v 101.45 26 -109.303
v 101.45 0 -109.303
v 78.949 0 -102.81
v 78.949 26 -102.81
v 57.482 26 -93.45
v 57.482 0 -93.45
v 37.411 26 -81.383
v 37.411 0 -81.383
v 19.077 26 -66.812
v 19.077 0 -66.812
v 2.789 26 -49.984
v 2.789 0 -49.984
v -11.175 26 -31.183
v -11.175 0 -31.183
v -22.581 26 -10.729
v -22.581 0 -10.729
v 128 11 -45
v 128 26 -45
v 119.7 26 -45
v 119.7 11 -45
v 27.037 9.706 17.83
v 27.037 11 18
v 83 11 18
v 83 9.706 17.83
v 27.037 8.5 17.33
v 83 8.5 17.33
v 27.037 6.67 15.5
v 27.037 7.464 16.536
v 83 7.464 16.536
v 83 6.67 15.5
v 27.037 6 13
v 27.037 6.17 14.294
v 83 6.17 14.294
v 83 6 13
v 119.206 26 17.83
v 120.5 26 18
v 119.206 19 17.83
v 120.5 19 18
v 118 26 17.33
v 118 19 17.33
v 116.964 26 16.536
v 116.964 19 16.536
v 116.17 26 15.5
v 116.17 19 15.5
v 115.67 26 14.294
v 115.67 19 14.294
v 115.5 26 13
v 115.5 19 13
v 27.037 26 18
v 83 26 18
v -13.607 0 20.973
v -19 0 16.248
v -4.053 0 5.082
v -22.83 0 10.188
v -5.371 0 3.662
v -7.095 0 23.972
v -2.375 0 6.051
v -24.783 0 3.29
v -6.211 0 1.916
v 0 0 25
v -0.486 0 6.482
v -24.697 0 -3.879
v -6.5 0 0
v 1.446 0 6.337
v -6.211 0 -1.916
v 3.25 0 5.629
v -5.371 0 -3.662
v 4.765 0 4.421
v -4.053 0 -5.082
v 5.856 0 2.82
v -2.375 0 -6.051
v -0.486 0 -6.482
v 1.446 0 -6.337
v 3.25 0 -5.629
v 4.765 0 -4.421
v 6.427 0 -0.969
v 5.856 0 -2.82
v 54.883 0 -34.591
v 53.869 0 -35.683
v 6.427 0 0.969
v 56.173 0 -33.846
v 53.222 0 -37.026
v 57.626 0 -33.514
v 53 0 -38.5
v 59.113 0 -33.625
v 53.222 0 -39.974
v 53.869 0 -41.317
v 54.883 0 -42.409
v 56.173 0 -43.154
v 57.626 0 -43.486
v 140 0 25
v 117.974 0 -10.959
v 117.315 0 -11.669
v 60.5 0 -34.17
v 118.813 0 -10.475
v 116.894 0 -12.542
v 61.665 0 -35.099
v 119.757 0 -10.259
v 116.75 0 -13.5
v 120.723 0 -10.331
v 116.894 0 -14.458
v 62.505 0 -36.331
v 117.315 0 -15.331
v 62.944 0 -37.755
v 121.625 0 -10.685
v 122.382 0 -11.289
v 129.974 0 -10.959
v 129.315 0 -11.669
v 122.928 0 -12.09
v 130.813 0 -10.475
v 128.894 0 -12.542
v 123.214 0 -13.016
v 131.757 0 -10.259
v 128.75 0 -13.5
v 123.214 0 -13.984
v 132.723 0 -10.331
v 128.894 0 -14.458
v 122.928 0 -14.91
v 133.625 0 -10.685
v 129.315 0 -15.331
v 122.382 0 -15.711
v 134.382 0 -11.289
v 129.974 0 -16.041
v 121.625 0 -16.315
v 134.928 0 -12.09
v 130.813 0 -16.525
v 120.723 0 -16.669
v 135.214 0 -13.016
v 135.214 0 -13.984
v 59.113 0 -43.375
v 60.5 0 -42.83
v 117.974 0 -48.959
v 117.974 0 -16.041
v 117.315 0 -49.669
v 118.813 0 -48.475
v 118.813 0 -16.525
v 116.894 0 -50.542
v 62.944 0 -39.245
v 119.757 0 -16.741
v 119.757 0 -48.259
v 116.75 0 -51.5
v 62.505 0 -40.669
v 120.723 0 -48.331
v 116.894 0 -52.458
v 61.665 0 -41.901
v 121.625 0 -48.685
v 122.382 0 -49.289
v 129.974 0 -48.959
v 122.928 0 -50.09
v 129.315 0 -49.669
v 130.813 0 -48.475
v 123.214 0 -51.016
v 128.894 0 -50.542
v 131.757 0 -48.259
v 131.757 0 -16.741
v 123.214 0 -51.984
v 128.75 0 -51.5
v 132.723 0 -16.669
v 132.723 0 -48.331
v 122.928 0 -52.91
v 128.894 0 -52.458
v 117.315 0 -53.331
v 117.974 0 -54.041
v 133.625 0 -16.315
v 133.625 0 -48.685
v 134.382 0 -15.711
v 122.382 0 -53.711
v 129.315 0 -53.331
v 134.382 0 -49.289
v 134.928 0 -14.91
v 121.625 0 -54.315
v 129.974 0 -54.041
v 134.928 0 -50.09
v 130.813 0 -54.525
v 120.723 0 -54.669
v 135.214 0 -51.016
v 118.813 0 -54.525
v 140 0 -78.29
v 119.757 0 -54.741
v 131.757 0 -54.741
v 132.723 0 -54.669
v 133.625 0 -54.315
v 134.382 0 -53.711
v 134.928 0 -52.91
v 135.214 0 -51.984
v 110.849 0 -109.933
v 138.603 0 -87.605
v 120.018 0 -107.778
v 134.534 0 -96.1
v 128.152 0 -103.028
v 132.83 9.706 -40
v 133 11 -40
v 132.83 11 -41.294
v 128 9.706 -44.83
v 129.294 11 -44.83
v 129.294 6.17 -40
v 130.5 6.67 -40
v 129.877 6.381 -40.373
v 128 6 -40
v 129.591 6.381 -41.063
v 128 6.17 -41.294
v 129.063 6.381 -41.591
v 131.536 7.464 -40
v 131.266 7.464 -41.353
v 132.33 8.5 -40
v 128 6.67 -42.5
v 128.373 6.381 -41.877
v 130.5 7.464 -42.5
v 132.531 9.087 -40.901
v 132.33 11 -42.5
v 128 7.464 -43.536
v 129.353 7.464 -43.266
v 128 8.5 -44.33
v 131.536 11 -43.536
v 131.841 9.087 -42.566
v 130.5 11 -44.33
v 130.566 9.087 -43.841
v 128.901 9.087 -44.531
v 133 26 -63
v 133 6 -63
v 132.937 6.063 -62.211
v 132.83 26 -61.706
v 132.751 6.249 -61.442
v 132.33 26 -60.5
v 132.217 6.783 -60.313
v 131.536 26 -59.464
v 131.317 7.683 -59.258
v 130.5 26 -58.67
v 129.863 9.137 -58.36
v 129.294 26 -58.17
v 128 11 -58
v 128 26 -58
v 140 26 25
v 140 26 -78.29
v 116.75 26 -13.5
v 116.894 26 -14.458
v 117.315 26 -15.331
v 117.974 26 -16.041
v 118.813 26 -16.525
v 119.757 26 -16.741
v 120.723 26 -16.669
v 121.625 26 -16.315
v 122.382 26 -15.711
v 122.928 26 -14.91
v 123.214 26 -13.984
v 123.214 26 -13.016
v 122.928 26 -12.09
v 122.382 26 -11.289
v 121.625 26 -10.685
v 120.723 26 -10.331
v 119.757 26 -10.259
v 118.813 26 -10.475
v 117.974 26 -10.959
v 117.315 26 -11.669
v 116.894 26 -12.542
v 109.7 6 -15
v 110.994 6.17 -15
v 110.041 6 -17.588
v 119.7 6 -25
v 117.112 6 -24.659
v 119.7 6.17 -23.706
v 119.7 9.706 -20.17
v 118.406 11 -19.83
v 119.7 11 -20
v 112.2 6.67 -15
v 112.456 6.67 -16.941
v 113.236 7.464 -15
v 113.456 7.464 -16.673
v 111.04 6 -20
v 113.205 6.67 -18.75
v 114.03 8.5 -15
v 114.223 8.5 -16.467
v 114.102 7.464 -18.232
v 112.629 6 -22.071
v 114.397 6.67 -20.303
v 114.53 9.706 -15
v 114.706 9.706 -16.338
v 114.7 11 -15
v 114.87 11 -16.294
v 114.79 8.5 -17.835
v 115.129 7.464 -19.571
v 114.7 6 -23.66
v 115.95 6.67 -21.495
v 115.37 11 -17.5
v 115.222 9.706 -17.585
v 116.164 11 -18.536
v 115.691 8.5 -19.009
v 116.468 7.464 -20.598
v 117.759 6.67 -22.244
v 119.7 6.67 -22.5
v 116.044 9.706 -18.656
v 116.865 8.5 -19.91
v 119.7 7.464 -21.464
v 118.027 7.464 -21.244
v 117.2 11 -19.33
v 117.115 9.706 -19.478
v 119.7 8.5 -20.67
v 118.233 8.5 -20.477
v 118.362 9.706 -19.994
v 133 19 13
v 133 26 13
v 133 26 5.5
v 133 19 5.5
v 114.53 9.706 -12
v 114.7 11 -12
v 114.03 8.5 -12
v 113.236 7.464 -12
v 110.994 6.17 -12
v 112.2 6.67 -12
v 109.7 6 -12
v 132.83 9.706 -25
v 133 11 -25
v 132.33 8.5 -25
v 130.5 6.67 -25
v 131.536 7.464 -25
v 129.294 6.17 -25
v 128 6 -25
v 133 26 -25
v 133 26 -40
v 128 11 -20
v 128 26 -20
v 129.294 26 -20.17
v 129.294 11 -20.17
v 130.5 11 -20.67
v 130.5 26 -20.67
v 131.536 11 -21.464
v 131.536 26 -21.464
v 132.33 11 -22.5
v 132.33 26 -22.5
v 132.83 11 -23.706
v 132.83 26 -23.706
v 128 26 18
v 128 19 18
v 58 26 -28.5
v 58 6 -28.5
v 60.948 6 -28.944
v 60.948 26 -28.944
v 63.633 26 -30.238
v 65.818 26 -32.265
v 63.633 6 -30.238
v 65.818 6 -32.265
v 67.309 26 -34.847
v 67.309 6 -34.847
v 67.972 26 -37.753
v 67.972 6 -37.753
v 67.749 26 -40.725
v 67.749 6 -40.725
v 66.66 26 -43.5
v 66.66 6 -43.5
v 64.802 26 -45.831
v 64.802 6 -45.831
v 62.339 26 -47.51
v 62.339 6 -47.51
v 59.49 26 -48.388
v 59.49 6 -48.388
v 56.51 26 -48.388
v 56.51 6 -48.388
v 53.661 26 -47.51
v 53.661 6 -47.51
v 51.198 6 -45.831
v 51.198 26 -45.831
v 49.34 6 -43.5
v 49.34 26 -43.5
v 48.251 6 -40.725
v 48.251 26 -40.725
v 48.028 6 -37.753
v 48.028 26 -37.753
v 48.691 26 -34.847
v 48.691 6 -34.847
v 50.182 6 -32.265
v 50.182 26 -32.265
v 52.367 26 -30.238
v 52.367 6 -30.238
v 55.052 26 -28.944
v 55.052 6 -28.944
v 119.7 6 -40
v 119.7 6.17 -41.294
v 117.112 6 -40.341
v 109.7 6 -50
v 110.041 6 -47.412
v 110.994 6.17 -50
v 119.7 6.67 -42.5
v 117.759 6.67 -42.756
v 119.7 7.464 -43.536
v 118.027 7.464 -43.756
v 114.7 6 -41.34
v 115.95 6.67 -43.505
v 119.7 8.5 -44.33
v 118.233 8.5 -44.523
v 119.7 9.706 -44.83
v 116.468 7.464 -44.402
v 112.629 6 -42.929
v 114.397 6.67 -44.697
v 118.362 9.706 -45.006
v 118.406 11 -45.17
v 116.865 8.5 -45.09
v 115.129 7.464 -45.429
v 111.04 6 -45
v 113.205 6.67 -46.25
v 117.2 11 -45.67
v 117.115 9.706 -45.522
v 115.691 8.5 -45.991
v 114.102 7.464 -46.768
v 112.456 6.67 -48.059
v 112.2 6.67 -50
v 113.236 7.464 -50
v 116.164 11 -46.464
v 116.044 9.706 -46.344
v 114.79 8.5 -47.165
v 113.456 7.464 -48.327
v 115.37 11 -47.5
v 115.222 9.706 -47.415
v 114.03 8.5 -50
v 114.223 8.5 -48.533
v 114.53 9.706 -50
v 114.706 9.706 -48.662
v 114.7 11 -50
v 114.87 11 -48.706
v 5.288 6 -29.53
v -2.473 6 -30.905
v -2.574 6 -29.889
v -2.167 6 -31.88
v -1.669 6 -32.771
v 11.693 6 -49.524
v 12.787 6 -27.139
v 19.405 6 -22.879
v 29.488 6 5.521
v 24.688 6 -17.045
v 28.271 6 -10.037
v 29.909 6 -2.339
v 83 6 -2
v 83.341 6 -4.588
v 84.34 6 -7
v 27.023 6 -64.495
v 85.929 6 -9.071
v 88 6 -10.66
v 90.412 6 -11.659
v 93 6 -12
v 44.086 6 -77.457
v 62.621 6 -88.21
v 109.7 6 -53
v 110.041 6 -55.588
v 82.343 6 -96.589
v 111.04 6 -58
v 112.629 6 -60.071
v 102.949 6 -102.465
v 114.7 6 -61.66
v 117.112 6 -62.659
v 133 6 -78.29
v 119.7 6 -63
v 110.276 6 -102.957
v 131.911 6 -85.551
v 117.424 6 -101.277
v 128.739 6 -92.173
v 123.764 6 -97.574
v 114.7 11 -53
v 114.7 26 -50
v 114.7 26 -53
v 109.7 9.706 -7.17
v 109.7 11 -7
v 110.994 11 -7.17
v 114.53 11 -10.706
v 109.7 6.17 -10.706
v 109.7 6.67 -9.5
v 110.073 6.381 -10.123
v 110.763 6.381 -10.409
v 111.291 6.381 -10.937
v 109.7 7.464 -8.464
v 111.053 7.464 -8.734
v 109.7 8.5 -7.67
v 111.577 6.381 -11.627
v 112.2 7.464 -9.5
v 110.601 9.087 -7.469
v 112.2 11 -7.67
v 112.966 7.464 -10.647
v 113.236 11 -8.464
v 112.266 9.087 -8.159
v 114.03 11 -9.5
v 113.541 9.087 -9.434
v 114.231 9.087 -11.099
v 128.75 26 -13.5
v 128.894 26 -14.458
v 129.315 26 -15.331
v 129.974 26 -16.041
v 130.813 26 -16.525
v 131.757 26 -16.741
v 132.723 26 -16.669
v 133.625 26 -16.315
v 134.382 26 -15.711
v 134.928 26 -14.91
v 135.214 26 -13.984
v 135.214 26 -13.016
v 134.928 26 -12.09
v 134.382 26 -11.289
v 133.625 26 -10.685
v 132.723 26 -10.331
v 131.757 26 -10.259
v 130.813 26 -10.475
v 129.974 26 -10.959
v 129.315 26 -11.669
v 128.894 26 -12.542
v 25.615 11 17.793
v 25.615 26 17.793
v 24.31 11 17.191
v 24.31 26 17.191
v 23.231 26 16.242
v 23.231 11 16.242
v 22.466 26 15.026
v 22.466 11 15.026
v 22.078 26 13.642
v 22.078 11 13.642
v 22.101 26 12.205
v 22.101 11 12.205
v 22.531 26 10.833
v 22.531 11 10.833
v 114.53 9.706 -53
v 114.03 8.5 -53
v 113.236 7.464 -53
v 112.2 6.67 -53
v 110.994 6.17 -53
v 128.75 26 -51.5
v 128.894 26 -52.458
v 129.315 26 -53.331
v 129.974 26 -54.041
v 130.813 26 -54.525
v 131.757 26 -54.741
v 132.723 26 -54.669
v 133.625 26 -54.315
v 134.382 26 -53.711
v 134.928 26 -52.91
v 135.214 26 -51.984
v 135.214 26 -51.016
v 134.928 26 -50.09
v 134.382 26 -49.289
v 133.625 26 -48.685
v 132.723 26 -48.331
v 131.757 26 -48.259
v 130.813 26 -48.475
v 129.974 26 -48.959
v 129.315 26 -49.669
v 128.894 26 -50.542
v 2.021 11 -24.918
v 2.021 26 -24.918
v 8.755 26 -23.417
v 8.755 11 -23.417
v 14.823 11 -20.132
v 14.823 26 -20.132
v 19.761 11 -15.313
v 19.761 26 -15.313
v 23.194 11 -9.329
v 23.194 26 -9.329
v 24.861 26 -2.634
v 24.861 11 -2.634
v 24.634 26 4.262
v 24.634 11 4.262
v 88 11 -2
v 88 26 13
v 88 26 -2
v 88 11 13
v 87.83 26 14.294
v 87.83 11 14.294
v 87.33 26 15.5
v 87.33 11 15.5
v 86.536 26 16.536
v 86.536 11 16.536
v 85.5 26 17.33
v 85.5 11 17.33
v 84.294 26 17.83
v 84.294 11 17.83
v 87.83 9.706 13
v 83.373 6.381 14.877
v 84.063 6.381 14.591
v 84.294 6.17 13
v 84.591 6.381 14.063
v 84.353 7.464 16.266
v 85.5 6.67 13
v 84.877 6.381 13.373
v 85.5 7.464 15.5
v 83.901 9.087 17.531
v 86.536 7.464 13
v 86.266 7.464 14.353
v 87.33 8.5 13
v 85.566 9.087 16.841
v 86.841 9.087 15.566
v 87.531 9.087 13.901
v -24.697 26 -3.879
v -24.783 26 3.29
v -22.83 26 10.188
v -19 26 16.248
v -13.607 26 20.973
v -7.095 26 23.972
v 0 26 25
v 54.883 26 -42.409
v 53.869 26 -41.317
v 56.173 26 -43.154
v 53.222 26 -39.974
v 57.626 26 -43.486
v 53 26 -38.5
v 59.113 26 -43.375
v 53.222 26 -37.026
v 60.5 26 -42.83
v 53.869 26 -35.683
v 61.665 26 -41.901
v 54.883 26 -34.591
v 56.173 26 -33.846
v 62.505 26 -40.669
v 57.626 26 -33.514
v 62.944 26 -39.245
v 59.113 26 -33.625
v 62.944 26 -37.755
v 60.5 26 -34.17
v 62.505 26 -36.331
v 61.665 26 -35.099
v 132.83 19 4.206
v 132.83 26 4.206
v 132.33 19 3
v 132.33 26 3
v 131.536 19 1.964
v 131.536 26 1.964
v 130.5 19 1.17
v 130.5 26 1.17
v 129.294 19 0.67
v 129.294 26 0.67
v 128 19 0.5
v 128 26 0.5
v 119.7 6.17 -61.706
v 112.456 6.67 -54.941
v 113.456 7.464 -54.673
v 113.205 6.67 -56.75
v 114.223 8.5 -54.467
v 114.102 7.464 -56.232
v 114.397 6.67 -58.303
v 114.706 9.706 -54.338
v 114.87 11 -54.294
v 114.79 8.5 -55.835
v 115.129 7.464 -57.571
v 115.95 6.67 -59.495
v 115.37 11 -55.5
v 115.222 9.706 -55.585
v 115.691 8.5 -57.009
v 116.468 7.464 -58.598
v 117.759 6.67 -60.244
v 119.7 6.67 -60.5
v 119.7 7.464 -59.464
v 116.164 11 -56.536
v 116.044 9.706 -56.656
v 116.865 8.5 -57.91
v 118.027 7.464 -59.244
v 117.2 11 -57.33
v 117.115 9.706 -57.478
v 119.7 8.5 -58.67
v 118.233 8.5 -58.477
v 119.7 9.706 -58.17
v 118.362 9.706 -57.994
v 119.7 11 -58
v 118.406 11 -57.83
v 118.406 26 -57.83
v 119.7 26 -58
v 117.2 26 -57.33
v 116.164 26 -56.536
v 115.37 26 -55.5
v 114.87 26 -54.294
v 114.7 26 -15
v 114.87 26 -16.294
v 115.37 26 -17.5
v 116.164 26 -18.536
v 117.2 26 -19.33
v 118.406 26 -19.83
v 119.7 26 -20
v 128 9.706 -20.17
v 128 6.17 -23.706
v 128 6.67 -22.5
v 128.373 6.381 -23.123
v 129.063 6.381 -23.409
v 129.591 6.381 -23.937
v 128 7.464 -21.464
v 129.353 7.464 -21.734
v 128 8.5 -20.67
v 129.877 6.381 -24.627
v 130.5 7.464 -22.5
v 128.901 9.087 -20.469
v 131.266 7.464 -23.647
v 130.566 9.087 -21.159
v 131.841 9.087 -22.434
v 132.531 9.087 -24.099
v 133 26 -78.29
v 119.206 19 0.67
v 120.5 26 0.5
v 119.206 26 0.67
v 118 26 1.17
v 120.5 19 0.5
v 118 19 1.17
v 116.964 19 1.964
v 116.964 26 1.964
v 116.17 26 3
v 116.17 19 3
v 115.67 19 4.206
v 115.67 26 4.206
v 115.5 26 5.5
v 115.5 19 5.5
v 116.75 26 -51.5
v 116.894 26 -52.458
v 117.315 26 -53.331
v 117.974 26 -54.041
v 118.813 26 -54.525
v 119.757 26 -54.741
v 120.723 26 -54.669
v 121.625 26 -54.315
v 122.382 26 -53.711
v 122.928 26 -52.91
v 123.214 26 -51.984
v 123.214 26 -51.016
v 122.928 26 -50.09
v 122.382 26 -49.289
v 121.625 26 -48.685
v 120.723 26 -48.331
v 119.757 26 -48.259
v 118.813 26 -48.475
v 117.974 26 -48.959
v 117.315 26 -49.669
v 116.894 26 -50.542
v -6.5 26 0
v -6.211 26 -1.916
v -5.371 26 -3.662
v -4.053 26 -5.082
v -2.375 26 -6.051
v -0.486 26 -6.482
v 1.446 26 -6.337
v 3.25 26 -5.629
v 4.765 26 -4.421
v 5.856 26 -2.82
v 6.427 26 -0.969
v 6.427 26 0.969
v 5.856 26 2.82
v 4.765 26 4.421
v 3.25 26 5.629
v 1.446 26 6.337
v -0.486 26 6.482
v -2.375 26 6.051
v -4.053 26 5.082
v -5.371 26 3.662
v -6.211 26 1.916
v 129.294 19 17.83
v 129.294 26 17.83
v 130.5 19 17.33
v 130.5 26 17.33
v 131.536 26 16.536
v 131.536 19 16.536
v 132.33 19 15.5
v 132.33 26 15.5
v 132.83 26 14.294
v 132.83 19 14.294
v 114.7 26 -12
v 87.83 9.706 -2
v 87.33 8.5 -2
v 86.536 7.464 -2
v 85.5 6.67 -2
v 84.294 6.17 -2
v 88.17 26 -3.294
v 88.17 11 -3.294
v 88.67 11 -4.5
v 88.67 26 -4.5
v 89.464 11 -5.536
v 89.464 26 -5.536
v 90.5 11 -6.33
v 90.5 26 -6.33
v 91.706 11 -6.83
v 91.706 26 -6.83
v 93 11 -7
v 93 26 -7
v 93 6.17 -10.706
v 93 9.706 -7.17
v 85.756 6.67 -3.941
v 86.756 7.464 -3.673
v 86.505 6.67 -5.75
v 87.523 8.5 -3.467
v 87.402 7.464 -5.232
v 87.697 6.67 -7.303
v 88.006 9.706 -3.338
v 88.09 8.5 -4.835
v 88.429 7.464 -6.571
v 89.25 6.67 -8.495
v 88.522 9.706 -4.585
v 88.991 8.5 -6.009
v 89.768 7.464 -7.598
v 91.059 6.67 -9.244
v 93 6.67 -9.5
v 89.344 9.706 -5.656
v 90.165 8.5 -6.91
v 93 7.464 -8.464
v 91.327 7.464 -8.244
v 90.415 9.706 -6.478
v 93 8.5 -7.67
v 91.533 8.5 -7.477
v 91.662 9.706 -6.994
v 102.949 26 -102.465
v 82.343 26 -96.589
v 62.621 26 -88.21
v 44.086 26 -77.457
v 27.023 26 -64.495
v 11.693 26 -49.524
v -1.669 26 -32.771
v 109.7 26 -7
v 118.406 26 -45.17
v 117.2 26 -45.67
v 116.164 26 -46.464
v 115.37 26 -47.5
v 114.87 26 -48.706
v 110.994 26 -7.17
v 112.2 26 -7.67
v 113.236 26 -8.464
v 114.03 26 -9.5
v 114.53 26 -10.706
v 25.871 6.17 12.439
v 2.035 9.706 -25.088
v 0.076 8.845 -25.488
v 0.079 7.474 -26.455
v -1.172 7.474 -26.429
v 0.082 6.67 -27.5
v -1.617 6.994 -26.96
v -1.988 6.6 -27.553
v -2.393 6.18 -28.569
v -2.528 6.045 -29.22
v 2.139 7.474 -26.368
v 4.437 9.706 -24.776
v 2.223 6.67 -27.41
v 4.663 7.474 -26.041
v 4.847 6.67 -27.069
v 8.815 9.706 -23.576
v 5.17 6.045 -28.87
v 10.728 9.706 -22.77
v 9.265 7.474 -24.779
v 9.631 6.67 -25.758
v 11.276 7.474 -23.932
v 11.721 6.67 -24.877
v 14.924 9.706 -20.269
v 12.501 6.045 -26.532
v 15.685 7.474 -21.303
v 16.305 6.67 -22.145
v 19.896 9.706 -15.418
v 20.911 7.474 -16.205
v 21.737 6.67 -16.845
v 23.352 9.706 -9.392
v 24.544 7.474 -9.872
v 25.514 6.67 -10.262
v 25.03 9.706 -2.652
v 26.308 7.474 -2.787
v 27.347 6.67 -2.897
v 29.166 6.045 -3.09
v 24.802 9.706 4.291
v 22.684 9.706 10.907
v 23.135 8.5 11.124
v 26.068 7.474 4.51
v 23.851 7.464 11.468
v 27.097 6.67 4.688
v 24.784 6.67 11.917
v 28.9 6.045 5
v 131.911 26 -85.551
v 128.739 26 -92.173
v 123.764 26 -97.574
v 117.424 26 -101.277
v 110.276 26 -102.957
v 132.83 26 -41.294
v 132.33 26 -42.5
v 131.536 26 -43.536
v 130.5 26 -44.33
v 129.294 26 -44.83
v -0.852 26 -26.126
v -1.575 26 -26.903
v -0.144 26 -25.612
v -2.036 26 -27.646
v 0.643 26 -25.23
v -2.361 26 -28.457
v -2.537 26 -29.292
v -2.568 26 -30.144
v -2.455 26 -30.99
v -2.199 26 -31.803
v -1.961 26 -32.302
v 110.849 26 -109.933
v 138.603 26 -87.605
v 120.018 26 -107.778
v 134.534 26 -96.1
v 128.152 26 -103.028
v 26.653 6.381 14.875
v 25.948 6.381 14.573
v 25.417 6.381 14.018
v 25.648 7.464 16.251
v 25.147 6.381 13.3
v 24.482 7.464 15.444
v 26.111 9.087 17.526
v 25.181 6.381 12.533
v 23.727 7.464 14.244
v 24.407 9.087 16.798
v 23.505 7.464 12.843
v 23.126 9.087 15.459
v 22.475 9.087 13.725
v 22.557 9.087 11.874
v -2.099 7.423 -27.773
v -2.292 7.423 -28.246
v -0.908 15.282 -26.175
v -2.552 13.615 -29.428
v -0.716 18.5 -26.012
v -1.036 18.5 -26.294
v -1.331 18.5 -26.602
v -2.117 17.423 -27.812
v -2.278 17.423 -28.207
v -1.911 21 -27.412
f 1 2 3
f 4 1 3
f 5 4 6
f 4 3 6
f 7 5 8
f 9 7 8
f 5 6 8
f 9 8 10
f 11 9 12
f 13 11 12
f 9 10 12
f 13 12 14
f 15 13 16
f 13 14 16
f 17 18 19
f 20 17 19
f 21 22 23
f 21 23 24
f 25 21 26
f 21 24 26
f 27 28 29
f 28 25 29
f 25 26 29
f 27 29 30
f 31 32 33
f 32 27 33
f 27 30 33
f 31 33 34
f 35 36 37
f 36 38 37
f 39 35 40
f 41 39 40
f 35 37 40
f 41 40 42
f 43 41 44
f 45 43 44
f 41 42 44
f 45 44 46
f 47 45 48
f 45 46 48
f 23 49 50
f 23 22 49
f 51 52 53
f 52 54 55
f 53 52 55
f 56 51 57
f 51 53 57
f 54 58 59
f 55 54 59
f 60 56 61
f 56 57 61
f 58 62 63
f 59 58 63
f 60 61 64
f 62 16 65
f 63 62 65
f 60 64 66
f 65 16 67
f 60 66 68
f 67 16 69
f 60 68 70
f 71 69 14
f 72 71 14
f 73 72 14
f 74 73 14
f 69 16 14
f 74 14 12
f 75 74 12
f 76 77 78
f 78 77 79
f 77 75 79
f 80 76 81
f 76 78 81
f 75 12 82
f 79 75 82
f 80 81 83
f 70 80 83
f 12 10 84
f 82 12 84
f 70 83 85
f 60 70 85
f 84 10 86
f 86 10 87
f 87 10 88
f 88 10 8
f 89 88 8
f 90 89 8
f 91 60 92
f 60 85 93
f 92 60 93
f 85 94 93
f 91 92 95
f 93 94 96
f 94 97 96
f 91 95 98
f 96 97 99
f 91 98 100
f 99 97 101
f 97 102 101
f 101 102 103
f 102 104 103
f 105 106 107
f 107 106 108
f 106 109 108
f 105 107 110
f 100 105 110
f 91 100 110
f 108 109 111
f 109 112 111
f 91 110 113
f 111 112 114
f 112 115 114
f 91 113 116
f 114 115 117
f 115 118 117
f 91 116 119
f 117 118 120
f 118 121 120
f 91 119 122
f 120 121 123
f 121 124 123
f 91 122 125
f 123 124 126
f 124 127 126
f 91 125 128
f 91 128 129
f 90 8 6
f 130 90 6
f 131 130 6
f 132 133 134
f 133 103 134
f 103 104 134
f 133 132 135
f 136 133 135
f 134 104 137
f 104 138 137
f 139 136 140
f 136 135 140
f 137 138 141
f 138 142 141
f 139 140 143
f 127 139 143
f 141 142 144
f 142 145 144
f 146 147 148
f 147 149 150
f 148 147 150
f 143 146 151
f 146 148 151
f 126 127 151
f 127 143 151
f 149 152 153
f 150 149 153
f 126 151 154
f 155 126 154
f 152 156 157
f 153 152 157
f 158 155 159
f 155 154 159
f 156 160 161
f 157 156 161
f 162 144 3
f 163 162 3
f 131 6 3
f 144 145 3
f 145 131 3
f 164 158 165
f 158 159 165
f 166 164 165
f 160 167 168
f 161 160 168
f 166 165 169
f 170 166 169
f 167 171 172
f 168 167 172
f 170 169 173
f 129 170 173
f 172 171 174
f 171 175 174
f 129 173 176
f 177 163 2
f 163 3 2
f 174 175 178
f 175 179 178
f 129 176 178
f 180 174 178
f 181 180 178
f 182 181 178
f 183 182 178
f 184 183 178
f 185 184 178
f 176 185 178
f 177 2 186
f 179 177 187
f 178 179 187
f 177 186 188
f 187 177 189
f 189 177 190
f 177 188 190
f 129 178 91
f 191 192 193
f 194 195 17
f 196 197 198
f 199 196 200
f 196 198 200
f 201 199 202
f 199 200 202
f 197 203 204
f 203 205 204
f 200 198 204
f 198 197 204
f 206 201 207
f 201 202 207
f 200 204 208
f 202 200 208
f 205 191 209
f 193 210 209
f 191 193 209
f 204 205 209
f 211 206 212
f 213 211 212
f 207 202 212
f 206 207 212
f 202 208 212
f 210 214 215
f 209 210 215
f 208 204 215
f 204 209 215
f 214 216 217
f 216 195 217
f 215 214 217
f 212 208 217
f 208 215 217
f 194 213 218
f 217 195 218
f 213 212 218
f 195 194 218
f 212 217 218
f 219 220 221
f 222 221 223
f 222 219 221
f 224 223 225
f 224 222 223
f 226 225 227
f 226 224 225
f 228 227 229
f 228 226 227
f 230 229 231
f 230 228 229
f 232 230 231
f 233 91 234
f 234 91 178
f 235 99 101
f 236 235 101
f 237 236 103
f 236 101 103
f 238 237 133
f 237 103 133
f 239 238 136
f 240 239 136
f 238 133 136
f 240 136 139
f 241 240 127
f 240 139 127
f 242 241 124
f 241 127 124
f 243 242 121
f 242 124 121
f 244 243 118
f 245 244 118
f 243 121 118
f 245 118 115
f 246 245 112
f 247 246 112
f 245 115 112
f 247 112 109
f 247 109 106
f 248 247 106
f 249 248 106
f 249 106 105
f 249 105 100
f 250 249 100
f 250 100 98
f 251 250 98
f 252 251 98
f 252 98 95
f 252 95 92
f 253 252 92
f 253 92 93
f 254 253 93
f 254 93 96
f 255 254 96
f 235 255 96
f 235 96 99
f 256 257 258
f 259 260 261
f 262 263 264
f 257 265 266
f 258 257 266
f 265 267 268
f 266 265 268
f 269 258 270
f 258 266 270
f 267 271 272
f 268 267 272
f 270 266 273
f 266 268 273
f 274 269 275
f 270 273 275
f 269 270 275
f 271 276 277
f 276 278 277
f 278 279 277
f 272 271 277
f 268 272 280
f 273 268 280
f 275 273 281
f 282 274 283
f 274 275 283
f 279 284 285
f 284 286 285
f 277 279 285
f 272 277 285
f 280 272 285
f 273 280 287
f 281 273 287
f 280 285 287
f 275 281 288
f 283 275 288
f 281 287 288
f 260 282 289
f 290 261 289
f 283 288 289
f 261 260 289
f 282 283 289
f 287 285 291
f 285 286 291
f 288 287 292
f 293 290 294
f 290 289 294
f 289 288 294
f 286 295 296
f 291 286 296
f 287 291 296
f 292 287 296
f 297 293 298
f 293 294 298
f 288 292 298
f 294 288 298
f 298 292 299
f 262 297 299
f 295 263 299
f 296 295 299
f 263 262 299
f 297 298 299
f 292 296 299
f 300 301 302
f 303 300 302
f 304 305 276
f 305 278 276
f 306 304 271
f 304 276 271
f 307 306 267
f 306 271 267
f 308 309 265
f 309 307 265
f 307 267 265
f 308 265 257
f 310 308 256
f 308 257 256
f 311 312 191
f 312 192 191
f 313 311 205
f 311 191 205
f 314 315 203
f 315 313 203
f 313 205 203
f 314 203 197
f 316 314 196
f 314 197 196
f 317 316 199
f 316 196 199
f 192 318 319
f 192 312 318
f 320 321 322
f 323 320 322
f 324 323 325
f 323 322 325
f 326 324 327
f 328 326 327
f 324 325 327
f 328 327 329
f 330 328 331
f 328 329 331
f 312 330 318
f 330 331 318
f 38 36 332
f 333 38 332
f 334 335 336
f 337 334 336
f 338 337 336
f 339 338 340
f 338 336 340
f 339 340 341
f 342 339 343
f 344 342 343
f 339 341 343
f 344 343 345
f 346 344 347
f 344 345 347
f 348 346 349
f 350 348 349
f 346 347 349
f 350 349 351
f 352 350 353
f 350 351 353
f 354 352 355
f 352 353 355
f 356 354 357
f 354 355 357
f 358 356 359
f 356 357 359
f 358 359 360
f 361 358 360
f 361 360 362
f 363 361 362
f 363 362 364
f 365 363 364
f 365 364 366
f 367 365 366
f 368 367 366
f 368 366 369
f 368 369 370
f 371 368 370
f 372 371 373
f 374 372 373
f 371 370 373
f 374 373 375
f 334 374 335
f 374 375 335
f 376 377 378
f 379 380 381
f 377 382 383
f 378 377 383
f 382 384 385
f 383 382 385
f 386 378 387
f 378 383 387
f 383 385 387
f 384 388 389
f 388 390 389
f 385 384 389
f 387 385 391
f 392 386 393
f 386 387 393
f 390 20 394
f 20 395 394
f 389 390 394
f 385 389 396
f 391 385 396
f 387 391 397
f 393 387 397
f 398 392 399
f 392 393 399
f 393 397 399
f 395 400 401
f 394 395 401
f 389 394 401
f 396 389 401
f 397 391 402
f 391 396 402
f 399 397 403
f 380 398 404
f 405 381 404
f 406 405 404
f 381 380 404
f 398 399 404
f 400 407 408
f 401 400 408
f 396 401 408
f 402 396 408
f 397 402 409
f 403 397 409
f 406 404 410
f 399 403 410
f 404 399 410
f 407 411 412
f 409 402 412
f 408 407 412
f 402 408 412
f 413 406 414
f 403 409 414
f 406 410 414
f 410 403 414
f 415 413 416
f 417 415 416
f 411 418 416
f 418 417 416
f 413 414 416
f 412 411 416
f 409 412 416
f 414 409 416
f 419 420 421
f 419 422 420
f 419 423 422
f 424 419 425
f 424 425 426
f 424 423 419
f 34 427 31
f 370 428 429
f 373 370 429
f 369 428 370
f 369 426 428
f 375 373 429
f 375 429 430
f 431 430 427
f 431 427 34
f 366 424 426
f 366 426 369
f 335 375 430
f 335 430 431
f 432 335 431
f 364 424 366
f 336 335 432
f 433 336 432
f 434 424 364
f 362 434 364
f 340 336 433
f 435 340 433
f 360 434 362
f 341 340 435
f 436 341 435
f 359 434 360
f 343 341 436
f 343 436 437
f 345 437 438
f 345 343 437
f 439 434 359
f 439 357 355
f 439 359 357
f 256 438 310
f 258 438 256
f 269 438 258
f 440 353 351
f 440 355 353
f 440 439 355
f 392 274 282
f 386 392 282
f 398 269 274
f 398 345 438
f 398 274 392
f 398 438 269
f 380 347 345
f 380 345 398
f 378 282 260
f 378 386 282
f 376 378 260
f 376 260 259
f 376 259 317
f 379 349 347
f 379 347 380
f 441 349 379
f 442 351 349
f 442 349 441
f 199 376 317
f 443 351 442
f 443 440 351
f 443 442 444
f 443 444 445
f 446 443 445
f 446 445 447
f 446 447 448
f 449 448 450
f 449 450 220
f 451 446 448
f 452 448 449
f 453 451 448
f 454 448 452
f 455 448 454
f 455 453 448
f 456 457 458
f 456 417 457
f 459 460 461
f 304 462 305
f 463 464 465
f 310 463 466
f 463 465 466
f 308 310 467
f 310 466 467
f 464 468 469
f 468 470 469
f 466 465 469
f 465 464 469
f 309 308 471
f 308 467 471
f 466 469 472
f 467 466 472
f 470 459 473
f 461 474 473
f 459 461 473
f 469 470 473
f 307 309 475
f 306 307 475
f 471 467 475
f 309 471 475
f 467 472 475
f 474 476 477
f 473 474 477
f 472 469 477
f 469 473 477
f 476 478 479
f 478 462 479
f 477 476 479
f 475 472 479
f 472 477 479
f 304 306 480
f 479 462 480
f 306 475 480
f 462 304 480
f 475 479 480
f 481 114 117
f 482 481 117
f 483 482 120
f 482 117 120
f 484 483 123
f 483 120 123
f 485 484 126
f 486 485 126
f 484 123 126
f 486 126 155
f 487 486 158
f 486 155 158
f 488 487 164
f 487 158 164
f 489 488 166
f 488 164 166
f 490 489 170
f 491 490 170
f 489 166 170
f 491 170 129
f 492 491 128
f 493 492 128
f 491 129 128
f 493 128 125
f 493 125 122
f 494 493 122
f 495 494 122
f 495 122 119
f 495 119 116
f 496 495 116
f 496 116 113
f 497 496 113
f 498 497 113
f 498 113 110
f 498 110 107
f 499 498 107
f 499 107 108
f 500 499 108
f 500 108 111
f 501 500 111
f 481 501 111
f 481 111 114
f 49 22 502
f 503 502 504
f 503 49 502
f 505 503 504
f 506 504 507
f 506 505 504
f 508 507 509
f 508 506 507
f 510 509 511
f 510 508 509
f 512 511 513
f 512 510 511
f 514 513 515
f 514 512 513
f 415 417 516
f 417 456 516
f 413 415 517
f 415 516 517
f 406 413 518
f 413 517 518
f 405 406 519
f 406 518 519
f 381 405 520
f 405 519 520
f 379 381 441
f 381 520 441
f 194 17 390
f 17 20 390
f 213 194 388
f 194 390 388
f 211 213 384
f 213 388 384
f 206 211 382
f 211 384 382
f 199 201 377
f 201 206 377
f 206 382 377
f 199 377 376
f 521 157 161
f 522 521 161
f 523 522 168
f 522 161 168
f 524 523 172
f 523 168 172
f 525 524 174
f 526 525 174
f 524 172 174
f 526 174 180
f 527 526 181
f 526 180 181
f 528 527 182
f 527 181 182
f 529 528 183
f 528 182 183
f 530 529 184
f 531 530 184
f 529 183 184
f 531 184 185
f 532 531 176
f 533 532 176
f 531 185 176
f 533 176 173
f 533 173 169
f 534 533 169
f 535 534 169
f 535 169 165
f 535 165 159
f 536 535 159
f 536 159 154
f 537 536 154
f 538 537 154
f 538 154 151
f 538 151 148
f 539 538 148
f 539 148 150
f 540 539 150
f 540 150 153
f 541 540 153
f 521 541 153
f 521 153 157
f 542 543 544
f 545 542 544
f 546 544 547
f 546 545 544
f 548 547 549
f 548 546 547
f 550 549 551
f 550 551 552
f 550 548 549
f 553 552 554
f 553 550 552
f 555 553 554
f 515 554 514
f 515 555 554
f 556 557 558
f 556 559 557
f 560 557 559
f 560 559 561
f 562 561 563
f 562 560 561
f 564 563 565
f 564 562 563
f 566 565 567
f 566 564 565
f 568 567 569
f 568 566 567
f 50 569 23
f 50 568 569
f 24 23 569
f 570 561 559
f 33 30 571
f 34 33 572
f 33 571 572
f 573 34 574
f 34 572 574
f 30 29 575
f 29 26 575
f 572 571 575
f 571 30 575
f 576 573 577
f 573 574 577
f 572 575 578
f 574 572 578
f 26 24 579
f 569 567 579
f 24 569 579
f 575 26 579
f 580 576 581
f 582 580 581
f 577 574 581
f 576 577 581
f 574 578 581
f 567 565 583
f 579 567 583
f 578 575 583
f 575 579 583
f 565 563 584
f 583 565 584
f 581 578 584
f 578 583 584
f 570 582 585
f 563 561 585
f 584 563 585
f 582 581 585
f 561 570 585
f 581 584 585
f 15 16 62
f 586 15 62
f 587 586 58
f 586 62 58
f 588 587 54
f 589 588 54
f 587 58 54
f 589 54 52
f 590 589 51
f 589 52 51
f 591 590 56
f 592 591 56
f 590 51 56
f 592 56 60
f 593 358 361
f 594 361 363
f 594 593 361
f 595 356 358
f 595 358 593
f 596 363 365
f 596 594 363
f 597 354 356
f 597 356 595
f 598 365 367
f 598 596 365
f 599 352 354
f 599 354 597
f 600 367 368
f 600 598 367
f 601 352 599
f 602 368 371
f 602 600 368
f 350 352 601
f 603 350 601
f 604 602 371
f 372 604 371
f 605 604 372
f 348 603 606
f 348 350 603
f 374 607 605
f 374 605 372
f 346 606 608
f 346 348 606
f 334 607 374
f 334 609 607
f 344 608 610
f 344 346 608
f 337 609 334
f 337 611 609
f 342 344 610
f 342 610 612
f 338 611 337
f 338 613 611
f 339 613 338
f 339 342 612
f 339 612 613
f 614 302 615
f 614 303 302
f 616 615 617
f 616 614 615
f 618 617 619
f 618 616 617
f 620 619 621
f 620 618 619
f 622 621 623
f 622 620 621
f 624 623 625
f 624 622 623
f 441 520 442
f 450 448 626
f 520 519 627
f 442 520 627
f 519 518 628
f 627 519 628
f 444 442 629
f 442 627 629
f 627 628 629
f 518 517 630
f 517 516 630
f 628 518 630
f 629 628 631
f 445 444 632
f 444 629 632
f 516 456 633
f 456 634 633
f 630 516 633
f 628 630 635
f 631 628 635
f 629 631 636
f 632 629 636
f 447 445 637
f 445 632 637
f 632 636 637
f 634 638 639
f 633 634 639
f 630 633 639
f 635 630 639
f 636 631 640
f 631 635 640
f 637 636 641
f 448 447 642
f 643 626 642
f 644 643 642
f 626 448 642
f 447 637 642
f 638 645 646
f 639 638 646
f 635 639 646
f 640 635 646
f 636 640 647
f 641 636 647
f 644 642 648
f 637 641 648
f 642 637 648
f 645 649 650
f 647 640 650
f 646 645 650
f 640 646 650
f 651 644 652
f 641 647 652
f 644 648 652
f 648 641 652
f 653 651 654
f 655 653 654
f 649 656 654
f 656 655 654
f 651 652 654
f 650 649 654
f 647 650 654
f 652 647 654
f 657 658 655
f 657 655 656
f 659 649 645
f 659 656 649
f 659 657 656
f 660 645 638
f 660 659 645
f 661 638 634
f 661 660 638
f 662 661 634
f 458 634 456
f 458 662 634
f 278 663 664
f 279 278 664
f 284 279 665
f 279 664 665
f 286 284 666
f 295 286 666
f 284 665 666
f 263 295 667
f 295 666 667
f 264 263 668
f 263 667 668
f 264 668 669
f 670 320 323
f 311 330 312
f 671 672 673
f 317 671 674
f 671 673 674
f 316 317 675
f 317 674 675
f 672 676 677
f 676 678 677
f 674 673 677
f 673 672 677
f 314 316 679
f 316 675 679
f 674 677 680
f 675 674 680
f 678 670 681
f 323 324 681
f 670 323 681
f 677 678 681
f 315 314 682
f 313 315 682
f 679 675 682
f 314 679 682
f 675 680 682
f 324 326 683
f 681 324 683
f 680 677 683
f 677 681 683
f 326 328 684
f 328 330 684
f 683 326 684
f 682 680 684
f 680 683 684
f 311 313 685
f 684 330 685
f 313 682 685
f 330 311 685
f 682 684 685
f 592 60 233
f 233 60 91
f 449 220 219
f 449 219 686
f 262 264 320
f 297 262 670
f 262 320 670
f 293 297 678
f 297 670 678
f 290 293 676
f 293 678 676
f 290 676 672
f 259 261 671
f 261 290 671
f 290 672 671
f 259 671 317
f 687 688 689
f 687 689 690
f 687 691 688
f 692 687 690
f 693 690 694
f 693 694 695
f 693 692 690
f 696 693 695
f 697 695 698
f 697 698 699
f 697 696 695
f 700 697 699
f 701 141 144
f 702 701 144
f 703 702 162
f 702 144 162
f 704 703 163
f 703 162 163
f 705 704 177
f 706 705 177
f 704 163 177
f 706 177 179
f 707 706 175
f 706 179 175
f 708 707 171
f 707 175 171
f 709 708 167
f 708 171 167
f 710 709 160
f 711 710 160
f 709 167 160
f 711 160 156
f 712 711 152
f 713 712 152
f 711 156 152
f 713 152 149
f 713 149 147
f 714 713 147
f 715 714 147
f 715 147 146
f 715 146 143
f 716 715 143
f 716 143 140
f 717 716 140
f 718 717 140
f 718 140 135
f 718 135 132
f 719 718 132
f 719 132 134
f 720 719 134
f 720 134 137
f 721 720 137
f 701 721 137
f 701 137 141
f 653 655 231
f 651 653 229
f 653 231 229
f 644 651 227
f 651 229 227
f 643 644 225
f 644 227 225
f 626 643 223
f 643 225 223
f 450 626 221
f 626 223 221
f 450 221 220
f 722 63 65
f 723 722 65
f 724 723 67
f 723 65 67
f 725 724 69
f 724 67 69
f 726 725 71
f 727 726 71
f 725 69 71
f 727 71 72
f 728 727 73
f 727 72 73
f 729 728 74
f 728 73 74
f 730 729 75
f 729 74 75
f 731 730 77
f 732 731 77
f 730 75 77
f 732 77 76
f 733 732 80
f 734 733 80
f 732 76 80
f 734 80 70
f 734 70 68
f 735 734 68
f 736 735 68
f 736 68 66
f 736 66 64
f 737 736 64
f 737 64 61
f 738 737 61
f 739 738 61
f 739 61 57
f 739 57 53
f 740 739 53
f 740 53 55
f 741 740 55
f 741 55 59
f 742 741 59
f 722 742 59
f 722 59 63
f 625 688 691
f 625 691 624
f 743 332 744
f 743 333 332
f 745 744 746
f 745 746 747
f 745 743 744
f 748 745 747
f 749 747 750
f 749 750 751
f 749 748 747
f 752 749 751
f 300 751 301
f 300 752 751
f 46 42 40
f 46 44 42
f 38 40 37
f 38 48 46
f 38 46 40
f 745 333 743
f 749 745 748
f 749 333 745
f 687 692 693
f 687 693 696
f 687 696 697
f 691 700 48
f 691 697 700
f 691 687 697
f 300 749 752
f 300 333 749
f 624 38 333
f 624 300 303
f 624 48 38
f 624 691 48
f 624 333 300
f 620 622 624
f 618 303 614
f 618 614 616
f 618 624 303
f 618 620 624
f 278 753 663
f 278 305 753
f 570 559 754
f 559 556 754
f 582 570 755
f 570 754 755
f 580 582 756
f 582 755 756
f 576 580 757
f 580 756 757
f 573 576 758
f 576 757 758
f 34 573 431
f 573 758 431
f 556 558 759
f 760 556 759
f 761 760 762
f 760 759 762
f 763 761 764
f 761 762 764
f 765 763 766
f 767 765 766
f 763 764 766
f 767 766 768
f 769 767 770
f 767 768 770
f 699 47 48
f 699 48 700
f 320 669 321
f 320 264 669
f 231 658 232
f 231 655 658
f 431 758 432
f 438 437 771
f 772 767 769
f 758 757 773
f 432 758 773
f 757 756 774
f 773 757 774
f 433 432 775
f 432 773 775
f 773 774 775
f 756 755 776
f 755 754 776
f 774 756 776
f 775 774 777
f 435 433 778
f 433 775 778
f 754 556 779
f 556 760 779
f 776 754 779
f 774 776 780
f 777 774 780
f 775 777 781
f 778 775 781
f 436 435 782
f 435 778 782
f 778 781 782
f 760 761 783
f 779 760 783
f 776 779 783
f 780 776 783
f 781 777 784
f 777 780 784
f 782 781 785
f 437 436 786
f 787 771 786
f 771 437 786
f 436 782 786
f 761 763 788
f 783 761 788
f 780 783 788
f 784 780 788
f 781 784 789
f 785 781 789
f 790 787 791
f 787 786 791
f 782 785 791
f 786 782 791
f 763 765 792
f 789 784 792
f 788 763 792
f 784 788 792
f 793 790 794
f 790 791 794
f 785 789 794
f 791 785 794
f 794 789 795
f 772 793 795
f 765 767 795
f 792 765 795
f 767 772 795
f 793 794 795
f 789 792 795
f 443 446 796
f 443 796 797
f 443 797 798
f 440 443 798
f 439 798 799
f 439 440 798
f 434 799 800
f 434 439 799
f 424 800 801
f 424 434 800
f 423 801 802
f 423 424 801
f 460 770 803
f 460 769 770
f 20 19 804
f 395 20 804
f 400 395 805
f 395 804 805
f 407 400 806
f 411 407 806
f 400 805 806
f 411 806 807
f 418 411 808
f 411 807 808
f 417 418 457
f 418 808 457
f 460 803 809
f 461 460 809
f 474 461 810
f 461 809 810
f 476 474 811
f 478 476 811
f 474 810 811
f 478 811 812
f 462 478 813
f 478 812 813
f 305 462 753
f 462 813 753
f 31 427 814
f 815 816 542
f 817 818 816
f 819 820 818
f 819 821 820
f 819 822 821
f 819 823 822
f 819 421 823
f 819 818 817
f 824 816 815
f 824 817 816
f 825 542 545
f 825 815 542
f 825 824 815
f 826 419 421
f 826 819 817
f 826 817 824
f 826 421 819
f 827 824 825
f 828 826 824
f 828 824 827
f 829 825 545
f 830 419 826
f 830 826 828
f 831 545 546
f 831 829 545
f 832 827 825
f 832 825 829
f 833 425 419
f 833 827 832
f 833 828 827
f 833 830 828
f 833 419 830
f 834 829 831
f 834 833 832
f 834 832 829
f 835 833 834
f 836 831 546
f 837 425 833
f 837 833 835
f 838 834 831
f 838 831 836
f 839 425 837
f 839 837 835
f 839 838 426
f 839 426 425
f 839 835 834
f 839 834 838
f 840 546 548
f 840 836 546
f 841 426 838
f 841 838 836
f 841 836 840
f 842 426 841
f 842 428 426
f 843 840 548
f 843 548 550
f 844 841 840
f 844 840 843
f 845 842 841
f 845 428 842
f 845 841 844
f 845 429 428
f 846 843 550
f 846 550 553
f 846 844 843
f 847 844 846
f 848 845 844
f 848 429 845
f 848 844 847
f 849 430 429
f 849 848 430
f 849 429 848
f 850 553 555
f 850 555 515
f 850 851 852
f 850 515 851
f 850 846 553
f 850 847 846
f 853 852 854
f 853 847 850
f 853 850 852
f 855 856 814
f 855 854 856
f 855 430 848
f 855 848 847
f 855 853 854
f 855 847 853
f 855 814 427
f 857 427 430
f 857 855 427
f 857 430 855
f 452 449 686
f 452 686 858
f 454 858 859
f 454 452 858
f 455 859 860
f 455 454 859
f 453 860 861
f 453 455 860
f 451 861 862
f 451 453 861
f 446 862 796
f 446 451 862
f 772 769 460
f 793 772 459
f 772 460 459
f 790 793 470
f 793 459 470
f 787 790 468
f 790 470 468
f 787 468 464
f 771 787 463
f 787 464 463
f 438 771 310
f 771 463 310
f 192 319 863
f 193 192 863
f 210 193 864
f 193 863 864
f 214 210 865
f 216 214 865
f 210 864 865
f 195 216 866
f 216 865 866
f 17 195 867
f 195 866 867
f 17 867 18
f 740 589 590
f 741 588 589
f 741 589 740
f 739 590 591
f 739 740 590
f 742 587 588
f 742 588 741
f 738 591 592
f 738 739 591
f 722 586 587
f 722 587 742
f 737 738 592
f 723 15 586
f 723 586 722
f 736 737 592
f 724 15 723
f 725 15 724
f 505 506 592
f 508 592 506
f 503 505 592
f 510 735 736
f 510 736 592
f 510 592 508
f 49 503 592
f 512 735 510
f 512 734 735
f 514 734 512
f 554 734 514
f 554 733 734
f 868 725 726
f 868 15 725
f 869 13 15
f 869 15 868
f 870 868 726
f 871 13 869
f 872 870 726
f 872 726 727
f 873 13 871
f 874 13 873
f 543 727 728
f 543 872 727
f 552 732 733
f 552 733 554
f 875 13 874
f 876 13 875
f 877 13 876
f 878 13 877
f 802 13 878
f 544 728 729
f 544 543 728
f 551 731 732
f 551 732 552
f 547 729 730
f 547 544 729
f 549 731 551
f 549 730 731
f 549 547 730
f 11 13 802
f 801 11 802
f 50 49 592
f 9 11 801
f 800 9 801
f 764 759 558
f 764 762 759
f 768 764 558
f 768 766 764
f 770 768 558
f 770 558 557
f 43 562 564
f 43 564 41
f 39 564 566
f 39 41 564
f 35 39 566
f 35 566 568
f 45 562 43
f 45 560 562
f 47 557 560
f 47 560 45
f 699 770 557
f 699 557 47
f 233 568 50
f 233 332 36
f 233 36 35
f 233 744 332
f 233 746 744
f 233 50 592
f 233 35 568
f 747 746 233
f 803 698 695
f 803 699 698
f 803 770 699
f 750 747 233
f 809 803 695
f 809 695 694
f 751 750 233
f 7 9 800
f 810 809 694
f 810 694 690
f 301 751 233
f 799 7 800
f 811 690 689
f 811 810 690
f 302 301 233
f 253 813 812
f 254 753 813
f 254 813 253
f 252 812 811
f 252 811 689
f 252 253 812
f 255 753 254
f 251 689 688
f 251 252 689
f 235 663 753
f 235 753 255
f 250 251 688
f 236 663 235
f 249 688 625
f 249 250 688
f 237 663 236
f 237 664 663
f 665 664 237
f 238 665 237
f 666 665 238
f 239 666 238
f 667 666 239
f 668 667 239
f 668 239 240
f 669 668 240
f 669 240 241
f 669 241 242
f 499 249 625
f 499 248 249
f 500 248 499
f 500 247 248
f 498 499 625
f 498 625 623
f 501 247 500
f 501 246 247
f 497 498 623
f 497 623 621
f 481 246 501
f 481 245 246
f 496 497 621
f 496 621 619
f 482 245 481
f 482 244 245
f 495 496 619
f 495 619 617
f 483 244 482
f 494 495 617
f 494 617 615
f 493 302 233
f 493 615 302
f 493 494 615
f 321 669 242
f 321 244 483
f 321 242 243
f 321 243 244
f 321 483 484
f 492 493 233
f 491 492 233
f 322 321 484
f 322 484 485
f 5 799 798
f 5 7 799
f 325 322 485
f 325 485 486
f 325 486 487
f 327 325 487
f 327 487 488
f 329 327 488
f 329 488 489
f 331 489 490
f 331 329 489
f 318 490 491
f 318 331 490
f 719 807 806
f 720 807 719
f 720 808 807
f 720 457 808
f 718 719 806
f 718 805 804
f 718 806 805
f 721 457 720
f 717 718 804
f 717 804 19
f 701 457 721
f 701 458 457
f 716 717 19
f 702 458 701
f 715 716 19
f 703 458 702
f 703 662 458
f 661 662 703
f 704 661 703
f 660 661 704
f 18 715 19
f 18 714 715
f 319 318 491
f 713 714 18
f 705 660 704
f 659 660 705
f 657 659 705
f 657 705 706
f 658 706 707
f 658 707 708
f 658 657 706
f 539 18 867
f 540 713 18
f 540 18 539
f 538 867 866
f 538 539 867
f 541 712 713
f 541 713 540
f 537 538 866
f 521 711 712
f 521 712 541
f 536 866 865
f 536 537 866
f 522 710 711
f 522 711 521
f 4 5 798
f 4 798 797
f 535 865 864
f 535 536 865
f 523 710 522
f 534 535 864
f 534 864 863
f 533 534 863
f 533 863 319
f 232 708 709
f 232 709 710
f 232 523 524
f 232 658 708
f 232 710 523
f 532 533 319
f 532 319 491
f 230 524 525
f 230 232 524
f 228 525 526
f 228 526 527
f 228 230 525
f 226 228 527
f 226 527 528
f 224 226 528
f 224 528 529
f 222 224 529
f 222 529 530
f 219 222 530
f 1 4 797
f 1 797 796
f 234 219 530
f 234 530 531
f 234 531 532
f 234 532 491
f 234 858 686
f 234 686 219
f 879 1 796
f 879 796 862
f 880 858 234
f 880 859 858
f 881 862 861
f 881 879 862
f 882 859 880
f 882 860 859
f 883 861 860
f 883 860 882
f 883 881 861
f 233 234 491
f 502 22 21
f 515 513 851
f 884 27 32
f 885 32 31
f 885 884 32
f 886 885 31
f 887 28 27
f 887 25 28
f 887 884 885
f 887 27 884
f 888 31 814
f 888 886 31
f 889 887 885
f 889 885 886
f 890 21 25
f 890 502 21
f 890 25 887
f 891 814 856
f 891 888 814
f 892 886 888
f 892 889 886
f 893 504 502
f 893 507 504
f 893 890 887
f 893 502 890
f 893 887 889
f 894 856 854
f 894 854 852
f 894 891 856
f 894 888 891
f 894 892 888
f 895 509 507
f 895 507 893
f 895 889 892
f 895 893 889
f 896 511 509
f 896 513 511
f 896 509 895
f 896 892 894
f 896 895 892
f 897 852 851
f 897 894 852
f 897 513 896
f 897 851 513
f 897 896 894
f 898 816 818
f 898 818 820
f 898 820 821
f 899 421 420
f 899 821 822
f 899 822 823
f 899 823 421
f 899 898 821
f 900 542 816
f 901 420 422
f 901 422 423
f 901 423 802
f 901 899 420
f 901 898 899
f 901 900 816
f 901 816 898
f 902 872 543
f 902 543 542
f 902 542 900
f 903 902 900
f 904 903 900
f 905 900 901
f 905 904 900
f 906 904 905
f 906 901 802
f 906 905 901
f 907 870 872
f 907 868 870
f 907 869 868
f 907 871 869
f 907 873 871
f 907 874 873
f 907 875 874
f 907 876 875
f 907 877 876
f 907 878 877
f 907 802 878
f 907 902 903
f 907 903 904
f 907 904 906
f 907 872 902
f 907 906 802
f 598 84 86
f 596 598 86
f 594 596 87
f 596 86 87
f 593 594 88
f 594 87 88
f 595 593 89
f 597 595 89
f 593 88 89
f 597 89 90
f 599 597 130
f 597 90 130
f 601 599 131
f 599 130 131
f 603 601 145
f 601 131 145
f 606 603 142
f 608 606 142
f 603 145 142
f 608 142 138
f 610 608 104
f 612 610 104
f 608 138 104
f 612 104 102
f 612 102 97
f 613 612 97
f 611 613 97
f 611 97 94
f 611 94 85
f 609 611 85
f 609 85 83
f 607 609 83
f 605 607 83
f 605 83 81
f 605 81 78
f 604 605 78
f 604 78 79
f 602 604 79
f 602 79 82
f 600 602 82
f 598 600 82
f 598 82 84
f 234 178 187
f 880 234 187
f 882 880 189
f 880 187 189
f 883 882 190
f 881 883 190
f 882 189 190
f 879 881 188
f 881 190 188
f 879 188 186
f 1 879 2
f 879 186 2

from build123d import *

# Parameters (mm, degrees)
BOSS_EXTRUDE1_DEPTH = 26
CUT_EXTRUDE1_START  = -20
CUT_EXTRUDE1_DEPTH  = 20
SKETCH3_W           = 17.5
SKETCH3_H           = 17.5
CUT_EXTRUDE2_DEPTH  = 7
FILLET1_R           = 5
HOLE1_D             = 13
HOLE1_DEPTH         = 30
HOLE2_D             = 6.5
HOLE2_DEPTH         = 30
SKETCH8_R           = 10
BOSS_EXTRUDE2_DEPTH = 20
HOLE3_D             = 10
HOLE3_DEPTH         = 30


with BuildPart() as part:
    # Sketch1 → Boss-Extrude1 (new body)
    with BuildSketch(Plane(origin=(0, 0, 0), x_dir=(1, 0, 0), z_dir=(0, 1, 0))):
        with BuildLine():
            Line((0, -25), (140, -25))
            Line((140, -25), (140, 78.289547156))
            ThreePointArc((140, 78.289547156), (128.151891006, 103.027720783), (101.450252951, 109.302865908))
            ThreePointArc((101.450252951, 109.302865908), (28.006457847, 74.395778776), (-22.580645161, 10.729140884))
            ThreePointArc((-22.580645161, 10.729140884), (-21.13325013, -13.356112419), (0, -25))
        make_face()
    extrude(amount=BOSS_EXTRUDE1_DEPTH)

    # Sketch2 → Cut-Extrude1 (cut)
    with BuildSketch(Plane(origin=(0, 26, 0), x_dir=(1, 0, 0), z_dir=(0, 1, 0)).offset(CUT_EXTRUDE1_START)):
        with BuildLine():
            Line((88, -18), (88, 7))
            Line((88, 7), (114.7, 7))
            Line((114.7, 7), (114.7, 20))
            Line((114.7, 20), (133, 20))
            Line((133, 20), (133, 45))
            Line((133, 45), (114.7, 45))
            Line((114.7, 45), (114.7, 58))
            Line((114.7, 58), (133, 58))
            Line((133, 58), (133, 78.289547156))
            ThreePointArc((133, 78.289547156), (123.764072516, 97.573635258), (102.949409781, 102.465283821))
            ThreePointArc((102.949409781, 102.465283821), (39.68753142, 74.427574639), (-7.525899138, 23.840319674))
            ThreePointArc((-7.525899138, 23.840319674), (21.489023757, 12.775831009), (17.349351573, -18))
            Line((17.349351573, -18), (88, -18))
        make_face()
    extrude(amount=CUT_EXTRUDE1_DEPTH, mode=Mode.SUBTRACT)

    # Sketch3 → Cut-Extrude2 (cut)
    with BuildSketch(Plane(origin=(0, 26, 0), x_dir=(1, 0, 0), z_dir=(0, 1, 0))):
        with Locations((124.25, -9.25)):
            Rectangle(SKETCH3_W, SKETCH3_H)
    extrude(amount=-CUT_EXTRUDE2_DEPTH, mode=Mode.SUBTRACT)

    # Fillet1
    fillet1_edges = [part.edges().sort_by_distance(p)[0] for p in [
        (123.85, 6, -58),
        (115.5, 22.5, 18),
        (115.5, 22.5, 0.5),
        (133, 22.5, 0.5),
        (133, 22.5, 18),
        (88, 16, 18),
        (133, 16, -45),
        (133, 16, -20),
        (114.7, 16, -20),
        (114.7, 16, -7),
        (88, 16, -7),
        (114.7, 16, -58),
        (133, 16, -58),
        (114.7, 16, -45),
        (-7.525899138, 16, -23.840319674),
        (17.349351573, 16, 18),
        (52.674675786, 6, 18),
        (88, 6, 5.5),
        (101.35, 6, -7),
        (114.7, 6, -13.5),
        (123.85, 6, -20),
        (133, 6, -32.5),
        (123.85, 6, -45),
        (114.7, 6, -51.5),
        (21.489023757, 6, -12.775831009),
    ]]
    fillet(fillet1_edges, radius=FILLET1_R)

    # Hole1
    with Locations(Plane(origin=(0, 26, 0), x_dir=(1, 0, 0), z_dir=(0, 1, 0))):
        with Locations((0, 0)):
            Hole(HOLE1_D / 2, depth=HOLE1_DEPTH)

    # Hole2
    with Locations(Plane(origin=(0, 26, 0), x_dir=(1, 0, 0), z_dir=(0, 1, 0))):
        with Locations((120, 51.5), (132, 51.5), (120, 13.5), (132, 13.5)):
            Hole(HOLE2_D / 2, depth=HOLE2_DEPTH)

    # Sketch8 → Boss-Extrude2 (add)
    with BuildSketch(Plane(origin=(0, 6, 0), x_dir=(1, 0, 0), z_dir=(0, 1, 0))):
        with Locations(Location((58, 38.5, 0), (0, 0, 270))):
            Circle(SKETCH8_R)
    extrude(amount=BOSS_EXTRUDE2_DEPTH)

    # Hole3
    with Locations(Plane(origin=(0, 26, 0), x_dir=(1, 0, 0), z_dir=(0, 1, 0))):
        with Locations((58, 38.5)):
            Hole(HOLE3_D / 2, depth=HOLE3_DEPTH)


solid = part.part
